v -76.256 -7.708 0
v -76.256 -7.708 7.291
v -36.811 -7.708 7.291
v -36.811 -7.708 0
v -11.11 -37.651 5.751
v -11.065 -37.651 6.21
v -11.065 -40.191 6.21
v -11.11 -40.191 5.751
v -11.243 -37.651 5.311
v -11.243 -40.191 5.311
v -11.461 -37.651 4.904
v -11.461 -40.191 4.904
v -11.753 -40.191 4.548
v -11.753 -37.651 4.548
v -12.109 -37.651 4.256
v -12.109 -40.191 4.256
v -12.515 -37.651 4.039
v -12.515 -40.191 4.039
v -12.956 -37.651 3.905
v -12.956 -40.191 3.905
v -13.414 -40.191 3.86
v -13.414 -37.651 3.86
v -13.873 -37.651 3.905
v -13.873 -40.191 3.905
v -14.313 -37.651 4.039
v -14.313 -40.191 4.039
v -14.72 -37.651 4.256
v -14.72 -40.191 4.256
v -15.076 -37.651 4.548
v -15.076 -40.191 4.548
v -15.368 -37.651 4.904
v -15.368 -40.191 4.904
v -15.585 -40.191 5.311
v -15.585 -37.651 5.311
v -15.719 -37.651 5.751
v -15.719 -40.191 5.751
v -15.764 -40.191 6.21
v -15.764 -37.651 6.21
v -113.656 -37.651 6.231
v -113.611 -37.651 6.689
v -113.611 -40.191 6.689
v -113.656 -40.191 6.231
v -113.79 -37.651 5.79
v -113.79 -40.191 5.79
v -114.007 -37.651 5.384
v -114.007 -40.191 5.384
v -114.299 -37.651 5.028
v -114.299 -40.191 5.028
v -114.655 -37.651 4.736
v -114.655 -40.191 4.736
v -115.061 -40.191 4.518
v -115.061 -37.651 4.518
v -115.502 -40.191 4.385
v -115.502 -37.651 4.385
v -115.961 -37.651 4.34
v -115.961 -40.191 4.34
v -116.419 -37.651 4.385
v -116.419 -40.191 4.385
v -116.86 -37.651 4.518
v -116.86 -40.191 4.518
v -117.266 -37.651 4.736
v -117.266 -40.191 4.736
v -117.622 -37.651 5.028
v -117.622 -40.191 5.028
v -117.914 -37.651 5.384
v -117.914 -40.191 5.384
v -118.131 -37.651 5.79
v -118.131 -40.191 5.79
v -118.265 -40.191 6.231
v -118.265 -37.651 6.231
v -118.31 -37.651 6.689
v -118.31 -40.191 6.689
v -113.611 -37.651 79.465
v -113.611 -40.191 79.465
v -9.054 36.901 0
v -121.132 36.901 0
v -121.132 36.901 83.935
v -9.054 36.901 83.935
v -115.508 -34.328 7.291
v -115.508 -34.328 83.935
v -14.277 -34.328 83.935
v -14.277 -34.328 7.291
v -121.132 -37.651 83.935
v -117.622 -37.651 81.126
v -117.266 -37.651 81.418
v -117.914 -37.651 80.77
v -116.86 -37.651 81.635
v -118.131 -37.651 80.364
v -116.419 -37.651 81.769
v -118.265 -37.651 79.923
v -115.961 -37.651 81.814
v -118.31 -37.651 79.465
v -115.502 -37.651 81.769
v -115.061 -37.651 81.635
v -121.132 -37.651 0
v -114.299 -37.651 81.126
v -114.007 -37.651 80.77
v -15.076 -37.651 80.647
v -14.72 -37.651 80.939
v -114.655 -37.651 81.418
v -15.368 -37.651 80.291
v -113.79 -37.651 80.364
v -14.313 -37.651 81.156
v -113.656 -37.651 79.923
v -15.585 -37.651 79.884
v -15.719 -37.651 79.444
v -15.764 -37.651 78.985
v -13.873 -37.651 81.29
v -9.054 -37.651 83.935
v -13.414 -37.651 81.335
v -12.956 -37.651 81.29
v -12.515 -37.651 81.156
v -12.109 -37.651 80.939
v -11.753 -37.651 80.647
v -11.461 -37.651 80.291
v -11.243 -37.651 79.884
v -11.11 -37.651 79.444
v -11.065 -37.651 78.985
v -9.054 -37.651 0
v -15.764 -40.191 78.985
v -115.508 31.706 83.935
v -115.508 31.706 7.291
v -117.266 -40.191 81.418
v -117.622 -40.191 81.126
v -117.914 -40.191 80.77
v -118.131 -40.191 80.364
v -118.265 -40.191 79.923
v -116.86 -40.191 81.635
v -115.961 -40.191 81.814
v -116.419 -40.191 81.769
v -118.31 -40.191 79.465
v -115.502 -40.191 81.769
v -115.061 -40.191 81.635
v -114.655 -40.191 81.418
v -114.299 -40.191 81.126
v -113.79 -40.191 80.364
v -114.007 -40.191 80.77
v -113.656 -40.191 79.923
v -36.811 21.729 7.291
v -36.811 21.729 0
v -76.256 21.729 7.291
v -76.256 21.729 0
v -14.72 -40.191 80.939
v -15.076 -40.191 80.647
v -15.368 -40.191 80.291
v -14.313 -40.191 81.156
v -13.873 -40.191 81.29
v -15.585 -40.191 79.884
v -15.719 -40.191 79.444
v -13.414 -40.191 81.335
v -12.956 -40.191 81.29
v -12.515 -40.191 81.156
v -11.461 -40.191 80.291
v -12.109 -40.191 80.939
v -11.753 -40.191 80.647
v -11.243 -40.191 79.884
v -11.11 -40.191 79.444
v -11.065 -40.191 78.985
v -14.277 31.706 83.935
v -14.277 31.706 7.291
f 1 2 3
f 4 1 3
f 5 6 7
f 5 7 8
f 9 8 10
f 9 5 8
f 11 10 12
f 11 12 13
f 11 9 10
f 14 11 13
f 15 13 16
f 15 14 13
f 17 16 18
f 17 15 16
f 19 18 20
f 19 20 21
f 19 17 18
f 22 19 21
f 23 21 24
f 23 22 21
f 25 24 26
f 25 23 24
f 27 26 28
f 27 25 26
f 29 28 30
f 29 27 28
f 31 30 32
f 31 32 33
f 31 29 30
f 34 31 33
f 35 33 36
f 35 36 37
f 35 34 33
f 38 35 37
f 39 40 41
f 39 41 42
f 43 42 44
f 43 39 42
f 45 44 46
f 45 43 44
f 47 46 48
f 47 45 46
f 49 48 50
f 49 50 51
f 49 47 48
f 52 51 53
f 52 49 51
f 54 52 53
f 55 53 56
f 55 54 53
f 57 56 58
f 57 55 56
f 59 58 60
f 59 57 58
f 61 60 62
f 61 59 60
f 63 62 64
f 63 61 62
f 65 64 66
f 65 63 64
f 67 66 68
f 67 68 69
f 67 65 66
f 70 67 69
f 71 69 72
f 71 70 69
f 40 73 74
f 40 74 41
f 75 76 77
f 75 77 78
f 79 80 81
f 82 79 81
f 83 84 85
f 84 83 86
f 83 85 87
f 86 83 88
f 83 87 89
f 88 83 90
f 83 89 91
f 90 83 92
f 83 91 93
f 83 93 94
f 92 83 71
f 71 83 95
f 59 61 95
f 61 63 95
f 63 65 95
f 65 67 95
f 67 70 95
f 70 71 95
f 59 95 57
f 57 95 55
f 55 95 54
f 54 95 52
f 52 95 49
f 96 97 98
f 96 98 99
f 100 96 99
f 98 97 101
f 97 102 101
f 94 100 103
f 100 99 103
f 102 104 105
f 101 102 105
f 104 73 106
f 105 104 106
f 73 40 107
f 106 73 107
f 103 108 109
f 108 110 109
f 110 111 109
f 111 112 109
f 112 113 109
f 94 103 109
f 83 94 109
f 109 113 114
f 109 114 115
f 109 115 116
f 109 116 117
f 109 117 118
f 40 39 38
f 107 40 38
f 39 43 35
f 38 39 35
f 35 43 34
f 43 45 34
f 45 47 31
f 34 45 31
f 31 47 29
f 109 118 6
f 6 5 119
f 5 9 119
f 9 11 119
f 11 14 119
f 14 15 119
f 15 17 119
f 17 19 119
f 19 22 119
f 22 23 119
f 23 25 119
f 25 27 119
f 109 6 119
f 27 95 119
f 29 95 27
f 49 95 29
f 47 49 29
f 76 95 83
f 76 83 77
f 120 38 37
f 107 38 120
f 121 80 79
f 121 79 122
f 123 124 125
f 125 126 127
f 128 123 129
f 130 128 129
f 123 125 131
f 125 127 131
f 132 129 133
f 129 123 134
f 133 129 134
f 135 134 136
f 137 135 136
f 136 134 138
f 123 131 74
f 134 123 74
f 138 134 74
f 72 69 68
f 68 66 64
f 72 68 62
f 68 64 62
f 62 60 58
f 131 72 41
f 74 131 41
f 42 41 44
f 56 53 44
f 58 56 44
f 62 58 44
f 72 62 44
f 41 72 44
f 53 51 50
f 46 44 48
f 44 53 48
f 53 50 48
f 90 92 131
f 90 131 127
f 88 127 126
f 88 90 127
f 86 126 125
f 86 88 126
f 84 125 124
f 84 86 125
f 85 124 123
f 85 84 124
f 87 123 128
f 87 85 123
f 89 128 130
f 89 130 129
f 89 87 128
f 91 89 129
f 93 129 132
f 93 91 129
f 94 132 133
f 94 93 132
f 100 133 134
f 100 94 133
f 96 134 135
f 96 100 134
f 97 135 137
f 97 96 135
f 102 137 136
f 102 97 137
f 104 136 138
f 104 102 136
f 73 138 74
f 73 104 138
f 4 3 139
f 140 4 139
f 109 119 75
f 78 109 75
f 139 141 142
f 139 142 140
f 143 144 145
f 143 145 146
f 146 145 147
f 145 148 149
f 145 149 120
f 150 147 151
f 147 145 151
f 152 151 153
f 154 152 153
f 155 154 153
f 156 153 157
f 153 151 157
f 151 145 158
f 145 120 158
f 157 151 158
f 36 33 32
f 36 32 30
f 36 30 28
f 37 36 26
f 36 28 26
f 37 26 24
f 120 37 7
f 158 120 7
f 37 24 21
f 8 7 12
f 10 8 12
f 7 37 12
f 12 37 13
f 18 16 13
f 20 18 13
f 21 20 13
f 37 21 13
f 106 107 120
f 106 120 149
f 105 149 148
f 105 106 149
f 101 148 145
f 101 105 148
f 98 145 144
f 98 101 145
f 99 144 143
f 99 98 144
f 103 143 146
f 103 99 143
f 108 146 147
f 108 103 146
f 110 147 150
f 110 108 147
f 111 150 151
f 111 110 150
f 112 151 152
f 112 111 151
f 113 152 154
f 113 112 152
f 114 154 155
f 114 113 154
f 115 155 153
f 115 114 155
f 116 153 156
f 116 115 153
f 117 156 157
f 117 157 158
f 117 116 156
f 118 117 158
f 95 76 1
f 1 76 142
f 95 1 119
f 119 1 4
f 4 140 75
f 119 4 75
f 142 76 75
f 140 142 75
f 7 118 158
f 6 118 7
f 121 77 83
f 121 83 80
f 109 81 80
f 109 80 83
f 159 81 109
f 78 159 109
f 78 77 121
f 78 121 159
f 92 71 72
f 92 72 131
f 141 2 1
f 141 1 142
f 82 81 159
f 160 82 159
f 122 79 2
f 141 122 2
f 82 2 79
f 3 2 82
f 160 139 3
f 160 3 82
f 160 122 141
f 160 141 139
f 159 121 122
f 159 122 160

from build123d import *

# Parameters (mm, degrees)
IZIM1_W                     = 112.077867903
IZIM1_H                     = 74.551796061
Y_KSEKLIK_EKSTR_ZYON1_DEPTH = 83.934945503
IZIM2_W                     = 101.231343604
IZIM2_H                     = 66.034767048
KES_EKSTR_ZYON2_DEPTH       = 76.644430763
IZIM3_W                     = 39.444954406
IZIM3_H                     = 29.43714267
KES_EKSTR_ZYON3_DEPTH       = 88.138
Y_KSEKLIK_EKSTR_ZYON2_DEPTH = 2.54


with BuildPart() as part:
    # Çizim1 → Yükseklik-Ekstrüzyon1 (new body)
    with BuildSketch(Plane.XY):
        with Locations((-65.092964498, -0.375260719)):
            Rectangle(IZIM1_W, IZIM1_H)
    extrude(amount=Y_KSEKLIK_EKSTR_ZYON1_DEPTH)

    # Çizim2 → Kes-Ekstrüzyon2 (cut)
    with BuildSketch(Plane.XY.offset(83.934945503)):
        with Locations((-64.892181627, -1.311030391)):
            Rectangle(IZIM2_W, IZIM2_H)
    extrude(amount=-KES_EKSTR_ZYON2_DEPTH, mode=Mode.SUBTRACT)

    # Çizim3 → Kes-Ekstrüzyon3 (cut)
    with BuildSketch(Plane.XY.offset(7.29051474)):
        with Locations((-56.533774773, 7.010455604)):
            Rectangle(IZIM3_W, IZIM3_H)
    extrude(amount=-KES_EKSTR_ZYON3_DEPTH, mode=Mode.SUBTRACT)

    # Çizim4 → Yükseklik-Ekstrüzyon2 (add)
    with BuildSketch(Plane(origin=(0, -37.651158749, 0), x_dir=(-1, 0, 0), z_dir=(0, -1, 0))):
        with BuildLine():
            Line((113.611032553, -79.46460314), (113.611032553, -6.689235104))
            ThreePointArc((113.611032553, -6.689235104), (115.960654564, -4.339613094), (118.310276574, -6.689235104))
            Line((118.310276574, -6.689235104), (118.310276574, -79.46460314))
            ThreePointArc((118.310276574, -79.46460314), (115.960654564, -81.814225151), (113.611032553, -79.46460314))
        make_face()
        with BuildLine():
            Line((11.064518037, -78.985150192), (11.064518037, -6.209782156))
            ThreePointArc((11.064518037, -6.209782156), (13.414140048, -3.860160145), (15.763762058, -6.209782156))
            Line((15.763762058, -6.209782156), (15.763762058, -78.985150192))
            ThreePointArc((15.763762058, -78.985150192), (13.414140048, -81.334772203), (11.064518037, -78.985150192))
        make_face()
    extrude(amount=Y_KSEKLIK_EKSTR_ZYON2_DEPTH)


solid = part.part
